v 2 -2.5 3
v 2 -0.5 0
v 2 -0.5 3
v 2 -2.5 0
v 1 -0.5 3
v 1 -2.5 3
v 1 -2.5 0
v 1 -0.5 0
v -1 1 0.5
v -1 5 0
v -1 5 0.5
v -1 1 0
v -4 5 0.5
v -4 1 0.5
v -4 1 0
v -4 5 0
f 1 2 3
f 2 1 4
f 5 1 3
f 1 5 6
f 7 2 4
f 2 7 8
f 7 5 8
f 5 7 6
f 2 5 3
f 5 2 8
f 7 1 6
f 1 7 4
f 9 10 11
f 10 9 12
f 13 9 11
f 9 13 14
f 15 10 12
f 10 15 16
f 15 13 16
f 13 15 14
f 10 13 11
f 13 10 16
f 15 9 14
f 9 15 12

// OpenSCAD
// file: lib.scad
default_param_a = 1;
default_param_b = 2;
default_param_c = 3;
default_param_d = [1.5, -1.5, 0.5*default_param_c];
default_param_e = "label";
default_param_f = "red";

default_params = [
    default_param_a,
    default_param_b,
    default_param_c,
    default_param_d,
    default_param_e,
    default_param_f
];

function param_a(p=default_params) = p[0];
function param_b(p=default_params) = p[1];
function param_c(p=default_params) = p[2];
function param_d(p=default_params) = p[3];
function param_e(p=default_params) = p[4];
function param_f(p=default_params) = p[5];

module echo_default_params(p=default_params) {
    echo();
    echo("In echo_default_params");
    echo(p);
}

module echo_params(p=default_params) {
    echo();
    echo("In echo_params");
    echo(p);
    echo("param_a:", param_a(p));
    echo("param_b:", param_b(p));
    echo("param_c:", param_c(p));
    echo("param_d:", param_d(p));
    echo("param_e:", param_e(p));
    echo("param_f:", param_f(p));
}

module module_with_params(p=default_params) {
    echo();
    echo("In module_with_params");
    echo(p);
    echo(param_a(p));
    color(param_f(p)) translate(param_d(p)) cube([param_a(p), param_b(p),param_c(p)], center=true);
    color(param_f(p)) translate(param_d(p) + [0,0,param_c(p)]) scale(0.1) text(param_e(p));
    
}
// main file
use <lib.scad>

// include <lib.scad>
// The variable "default_params" is available only with "include <lib.scad>" and not with "use <lib.scad>"
// echo(default_params);
// echo(default_param_a);
// Note that the next line will set "default_param" for every instance of its use including in "lib.scad"
// default_param_a = 10;
// echo(default_param_a);

// Use module with default parameters
echo_default_params();
echo_params();
module_with_params();

// Set up new list of parameters and use them
value_param_a = 3;
value_param_b = 4;
value_param_c = 0.5;
value_param_d = [-2.5, 3, 0.5*value_param_c];
value_param_e = "custom";
value_param_f = "blue";

value_params = [
    value_param_a,
    value_param_b,
    value_param_c,
    value_param_d,
    value_param_e,
    value_param_f
];

echo_params(value_params);
module_with_params(value_params);
